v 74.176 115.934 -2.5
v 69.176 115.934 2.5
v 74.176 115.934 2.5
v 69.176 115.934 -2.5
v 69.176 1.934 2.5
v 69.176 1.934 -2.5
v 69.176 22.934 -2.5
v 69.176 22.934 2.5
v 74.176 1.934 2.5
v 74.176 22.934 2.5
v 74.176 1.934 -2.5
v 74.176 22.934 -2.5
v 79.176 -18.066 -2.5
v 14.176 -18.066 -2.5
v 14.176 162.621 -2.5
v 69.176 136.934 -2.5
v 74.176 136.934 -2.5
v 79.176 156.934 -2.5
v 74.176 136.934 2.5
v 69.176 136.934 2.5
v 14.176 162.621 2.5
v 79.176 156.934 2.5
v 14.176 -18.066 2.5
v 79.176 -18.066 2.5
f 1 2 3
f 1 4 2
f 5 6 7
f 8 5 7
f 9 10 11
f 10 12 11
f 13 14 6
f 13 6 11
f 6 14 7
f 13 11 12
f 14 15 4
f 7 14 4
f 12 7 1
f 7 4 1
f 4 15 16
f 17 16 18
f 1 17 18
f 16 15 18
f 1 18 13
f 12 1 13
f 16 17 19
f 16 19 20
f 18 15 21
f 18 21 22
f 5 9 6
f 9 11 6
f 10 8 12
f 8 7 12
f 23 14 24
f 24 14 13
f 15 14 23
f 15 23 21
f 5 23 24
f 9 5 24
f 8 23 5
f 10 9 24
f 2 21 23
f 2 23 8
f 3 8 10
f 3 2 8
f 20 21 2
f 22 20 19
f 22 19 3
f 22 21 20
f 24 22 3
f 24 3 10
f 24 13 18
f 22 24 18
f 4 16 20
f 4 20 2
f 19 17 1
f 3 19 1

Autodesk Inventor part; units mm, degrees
ref_plane "YZ Plane" through (0, 0, 0) normal (1, 0, 0) x (0, 1, 0)
ref_plane "XZ Plane" through (0, 0, 0) normal (0, 1, 0) x (-1, 0, 0)
ref_plane "XY Plane" through (0, 0, 0) normal (0, 0, 1) x (1, 0, 0)
sketch "Sketch1" plane through (0, 0, 0) normal (0, 0, 1) x (1, 0, 0)
  line L0 (14.1765, -18.066) -> (14.1765, 162.6208)
  line L1 (14.1765, -18.066) -> (79.1765, -18.066)
  line L2 (79.1765, -18.066) -> (79.1765, 156.934)
  line L3 (79.1765, -18.066) -> (14.1765, -18.066)
  line L4 (79.1765, -18.066) -> (14.1765, -18.066)
  line L5 (14.1765, 162.6208) -> (79.1765, 156.934)
  line L6 (79.1765, 136.934) -> (74.1765, 136.934)
  line L7 (74.1765, 136.934) -> (74.1765, 115.934)
  line L8 (74.1765, 115.934) -> (79.1765, 115.934)
  line L9 (79.1765, 115.934) -> (79.1765, 136.934)
  line L10 (69.1765, 22.934) -> (74.1765, 22.934)
  line L11 (74.1765, 22.934) -> (74.1765, 1.934)
  line L12 (74.1765, 1.934) -> (69.1765, 1.934)
  line L13 (69.1765, 1.934) -> (69.1765, 22.934)
  line L14 (74.1765, 136.934) -> (69.1765, 136.934)
  line L15 (69.1765, 136.934) -> (69.1765, 115.934)
  line L16 (69.1765, 115.934) -> (74.1765, 115.934)
  line L17 (74.1765, 115.934) -> (74.1765, 136.934)
  point P0 (0, 0)
  point P1 (71.6765, 1.934)
  point P2 (79.2985, 0.69)
  point P3 (79.2985, 20.69)
  point P4 (79.1765, 115.934)
  dimension "d3" = 65
  dimension "d23" = 85
  dimension "d26" = 175
  dimension "d27" = 180.6868
  dimension "d28" = 5
  dimension "d29" = 21
  dimension "d30" = 5
  dimension "d31" = 21
  dimension "d32" = 20
  dimension "d33" = 20
  dimension "d35" = 5
  dimension "d36" = 5
extrude "Extrusion1" add sketch "Sketch1" along normal mid plane 5 contours L0 L5 L2 L6 L14 L15 L16 L8 L1 | L8 L7 L6 L2
equation "\"BendRadius\" = Thickness"
equation "\"BendReliefWidth\" = Thickness"
equation "\"BendReliefDepth\" = 0.5 * Thickness"
equation "\"CornerReliefSize\" = 4 * Thickness"
equation "\"MinimumRemnant\" = 2 * Thickness"
equation "\"TransitionRadius\" = BendRadius"
equation "\"JacobiRadiusSize\" = BendRadius"
equation "\"GapSize\" = Thickness"
equation "\"Thickness\" = 0.5"
properties part number "standformiddleslide1"
